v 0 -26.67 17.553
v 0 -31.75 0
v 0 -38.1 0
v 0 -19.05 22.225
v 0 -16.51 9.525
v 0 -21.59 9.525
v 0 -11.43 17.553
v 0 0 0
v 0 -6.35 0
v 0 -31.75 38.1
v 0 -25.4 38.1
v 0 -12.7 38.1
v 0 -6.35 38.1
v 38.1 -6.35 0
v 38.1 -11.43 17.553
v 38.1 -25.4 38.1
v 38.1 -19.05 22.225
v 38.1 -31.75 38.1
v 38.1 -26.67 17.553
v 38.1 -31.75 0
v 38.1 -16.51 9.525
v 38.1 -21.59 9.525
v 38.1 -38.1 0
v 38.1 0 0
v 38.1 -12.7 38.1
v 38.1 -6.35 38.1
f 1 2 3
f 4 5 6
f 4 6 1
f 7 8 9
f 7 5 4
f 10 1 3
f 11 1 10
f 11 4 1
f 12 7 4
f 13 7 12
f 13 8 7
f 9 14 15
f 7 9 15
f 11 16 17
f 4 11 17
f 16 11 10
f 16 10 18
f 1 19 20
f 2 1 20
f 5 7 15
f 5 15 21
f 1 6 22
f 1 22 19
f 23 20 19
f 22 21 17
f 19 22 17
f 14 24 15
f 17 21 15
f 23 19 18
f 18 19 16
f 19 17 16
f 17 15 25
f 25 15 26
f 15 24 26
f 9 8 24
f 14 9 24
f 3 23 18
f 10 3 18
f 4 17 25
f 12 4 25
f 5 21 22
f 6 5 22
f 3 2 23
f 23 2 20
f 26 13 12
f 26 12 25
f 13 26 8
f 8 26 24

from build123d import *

# Parameters (mm, degrees)
F0_W     = 38.1
F0_H     = 38.1
F1_DEPTH = 38.1
F6_DEPTH = 38.1


with BuildPart() as f1:
    # F0 (on Front) → F1 (new body)
    with BuildSketch(Plane.XZ):
        with Locations((19.05, 19.05)):
            Rectangle(F0_W, F0_H)
    extrude(amount=F1_DEPTH)

    # F5 (on face) → F6 (cut)
    with BuildSketch(Plane.YZ.offset(38.1)):
        Polygon((-31.75, 38.1), (-38.1, 38.1), (-38.1, 0), align=None)
        Polygon((-12.7, 38.1), (-25.4, 38.1), (-19.05, 22.225), align=None)
        Polygon((-6.35, 38.1), (0, 0), (0, 38.1), align=None)
        Polygon((-26.67, 17.5525732338), (-31.75, 0), (-6.35, 0), (-11.43, 17.5525732338), (-16.51, 9.525), (-21.59, 9.525), align=None)
    extrude(amount=-F6_DEPTH, mode=Mode.SUBTRACT)


solid = f1.part
